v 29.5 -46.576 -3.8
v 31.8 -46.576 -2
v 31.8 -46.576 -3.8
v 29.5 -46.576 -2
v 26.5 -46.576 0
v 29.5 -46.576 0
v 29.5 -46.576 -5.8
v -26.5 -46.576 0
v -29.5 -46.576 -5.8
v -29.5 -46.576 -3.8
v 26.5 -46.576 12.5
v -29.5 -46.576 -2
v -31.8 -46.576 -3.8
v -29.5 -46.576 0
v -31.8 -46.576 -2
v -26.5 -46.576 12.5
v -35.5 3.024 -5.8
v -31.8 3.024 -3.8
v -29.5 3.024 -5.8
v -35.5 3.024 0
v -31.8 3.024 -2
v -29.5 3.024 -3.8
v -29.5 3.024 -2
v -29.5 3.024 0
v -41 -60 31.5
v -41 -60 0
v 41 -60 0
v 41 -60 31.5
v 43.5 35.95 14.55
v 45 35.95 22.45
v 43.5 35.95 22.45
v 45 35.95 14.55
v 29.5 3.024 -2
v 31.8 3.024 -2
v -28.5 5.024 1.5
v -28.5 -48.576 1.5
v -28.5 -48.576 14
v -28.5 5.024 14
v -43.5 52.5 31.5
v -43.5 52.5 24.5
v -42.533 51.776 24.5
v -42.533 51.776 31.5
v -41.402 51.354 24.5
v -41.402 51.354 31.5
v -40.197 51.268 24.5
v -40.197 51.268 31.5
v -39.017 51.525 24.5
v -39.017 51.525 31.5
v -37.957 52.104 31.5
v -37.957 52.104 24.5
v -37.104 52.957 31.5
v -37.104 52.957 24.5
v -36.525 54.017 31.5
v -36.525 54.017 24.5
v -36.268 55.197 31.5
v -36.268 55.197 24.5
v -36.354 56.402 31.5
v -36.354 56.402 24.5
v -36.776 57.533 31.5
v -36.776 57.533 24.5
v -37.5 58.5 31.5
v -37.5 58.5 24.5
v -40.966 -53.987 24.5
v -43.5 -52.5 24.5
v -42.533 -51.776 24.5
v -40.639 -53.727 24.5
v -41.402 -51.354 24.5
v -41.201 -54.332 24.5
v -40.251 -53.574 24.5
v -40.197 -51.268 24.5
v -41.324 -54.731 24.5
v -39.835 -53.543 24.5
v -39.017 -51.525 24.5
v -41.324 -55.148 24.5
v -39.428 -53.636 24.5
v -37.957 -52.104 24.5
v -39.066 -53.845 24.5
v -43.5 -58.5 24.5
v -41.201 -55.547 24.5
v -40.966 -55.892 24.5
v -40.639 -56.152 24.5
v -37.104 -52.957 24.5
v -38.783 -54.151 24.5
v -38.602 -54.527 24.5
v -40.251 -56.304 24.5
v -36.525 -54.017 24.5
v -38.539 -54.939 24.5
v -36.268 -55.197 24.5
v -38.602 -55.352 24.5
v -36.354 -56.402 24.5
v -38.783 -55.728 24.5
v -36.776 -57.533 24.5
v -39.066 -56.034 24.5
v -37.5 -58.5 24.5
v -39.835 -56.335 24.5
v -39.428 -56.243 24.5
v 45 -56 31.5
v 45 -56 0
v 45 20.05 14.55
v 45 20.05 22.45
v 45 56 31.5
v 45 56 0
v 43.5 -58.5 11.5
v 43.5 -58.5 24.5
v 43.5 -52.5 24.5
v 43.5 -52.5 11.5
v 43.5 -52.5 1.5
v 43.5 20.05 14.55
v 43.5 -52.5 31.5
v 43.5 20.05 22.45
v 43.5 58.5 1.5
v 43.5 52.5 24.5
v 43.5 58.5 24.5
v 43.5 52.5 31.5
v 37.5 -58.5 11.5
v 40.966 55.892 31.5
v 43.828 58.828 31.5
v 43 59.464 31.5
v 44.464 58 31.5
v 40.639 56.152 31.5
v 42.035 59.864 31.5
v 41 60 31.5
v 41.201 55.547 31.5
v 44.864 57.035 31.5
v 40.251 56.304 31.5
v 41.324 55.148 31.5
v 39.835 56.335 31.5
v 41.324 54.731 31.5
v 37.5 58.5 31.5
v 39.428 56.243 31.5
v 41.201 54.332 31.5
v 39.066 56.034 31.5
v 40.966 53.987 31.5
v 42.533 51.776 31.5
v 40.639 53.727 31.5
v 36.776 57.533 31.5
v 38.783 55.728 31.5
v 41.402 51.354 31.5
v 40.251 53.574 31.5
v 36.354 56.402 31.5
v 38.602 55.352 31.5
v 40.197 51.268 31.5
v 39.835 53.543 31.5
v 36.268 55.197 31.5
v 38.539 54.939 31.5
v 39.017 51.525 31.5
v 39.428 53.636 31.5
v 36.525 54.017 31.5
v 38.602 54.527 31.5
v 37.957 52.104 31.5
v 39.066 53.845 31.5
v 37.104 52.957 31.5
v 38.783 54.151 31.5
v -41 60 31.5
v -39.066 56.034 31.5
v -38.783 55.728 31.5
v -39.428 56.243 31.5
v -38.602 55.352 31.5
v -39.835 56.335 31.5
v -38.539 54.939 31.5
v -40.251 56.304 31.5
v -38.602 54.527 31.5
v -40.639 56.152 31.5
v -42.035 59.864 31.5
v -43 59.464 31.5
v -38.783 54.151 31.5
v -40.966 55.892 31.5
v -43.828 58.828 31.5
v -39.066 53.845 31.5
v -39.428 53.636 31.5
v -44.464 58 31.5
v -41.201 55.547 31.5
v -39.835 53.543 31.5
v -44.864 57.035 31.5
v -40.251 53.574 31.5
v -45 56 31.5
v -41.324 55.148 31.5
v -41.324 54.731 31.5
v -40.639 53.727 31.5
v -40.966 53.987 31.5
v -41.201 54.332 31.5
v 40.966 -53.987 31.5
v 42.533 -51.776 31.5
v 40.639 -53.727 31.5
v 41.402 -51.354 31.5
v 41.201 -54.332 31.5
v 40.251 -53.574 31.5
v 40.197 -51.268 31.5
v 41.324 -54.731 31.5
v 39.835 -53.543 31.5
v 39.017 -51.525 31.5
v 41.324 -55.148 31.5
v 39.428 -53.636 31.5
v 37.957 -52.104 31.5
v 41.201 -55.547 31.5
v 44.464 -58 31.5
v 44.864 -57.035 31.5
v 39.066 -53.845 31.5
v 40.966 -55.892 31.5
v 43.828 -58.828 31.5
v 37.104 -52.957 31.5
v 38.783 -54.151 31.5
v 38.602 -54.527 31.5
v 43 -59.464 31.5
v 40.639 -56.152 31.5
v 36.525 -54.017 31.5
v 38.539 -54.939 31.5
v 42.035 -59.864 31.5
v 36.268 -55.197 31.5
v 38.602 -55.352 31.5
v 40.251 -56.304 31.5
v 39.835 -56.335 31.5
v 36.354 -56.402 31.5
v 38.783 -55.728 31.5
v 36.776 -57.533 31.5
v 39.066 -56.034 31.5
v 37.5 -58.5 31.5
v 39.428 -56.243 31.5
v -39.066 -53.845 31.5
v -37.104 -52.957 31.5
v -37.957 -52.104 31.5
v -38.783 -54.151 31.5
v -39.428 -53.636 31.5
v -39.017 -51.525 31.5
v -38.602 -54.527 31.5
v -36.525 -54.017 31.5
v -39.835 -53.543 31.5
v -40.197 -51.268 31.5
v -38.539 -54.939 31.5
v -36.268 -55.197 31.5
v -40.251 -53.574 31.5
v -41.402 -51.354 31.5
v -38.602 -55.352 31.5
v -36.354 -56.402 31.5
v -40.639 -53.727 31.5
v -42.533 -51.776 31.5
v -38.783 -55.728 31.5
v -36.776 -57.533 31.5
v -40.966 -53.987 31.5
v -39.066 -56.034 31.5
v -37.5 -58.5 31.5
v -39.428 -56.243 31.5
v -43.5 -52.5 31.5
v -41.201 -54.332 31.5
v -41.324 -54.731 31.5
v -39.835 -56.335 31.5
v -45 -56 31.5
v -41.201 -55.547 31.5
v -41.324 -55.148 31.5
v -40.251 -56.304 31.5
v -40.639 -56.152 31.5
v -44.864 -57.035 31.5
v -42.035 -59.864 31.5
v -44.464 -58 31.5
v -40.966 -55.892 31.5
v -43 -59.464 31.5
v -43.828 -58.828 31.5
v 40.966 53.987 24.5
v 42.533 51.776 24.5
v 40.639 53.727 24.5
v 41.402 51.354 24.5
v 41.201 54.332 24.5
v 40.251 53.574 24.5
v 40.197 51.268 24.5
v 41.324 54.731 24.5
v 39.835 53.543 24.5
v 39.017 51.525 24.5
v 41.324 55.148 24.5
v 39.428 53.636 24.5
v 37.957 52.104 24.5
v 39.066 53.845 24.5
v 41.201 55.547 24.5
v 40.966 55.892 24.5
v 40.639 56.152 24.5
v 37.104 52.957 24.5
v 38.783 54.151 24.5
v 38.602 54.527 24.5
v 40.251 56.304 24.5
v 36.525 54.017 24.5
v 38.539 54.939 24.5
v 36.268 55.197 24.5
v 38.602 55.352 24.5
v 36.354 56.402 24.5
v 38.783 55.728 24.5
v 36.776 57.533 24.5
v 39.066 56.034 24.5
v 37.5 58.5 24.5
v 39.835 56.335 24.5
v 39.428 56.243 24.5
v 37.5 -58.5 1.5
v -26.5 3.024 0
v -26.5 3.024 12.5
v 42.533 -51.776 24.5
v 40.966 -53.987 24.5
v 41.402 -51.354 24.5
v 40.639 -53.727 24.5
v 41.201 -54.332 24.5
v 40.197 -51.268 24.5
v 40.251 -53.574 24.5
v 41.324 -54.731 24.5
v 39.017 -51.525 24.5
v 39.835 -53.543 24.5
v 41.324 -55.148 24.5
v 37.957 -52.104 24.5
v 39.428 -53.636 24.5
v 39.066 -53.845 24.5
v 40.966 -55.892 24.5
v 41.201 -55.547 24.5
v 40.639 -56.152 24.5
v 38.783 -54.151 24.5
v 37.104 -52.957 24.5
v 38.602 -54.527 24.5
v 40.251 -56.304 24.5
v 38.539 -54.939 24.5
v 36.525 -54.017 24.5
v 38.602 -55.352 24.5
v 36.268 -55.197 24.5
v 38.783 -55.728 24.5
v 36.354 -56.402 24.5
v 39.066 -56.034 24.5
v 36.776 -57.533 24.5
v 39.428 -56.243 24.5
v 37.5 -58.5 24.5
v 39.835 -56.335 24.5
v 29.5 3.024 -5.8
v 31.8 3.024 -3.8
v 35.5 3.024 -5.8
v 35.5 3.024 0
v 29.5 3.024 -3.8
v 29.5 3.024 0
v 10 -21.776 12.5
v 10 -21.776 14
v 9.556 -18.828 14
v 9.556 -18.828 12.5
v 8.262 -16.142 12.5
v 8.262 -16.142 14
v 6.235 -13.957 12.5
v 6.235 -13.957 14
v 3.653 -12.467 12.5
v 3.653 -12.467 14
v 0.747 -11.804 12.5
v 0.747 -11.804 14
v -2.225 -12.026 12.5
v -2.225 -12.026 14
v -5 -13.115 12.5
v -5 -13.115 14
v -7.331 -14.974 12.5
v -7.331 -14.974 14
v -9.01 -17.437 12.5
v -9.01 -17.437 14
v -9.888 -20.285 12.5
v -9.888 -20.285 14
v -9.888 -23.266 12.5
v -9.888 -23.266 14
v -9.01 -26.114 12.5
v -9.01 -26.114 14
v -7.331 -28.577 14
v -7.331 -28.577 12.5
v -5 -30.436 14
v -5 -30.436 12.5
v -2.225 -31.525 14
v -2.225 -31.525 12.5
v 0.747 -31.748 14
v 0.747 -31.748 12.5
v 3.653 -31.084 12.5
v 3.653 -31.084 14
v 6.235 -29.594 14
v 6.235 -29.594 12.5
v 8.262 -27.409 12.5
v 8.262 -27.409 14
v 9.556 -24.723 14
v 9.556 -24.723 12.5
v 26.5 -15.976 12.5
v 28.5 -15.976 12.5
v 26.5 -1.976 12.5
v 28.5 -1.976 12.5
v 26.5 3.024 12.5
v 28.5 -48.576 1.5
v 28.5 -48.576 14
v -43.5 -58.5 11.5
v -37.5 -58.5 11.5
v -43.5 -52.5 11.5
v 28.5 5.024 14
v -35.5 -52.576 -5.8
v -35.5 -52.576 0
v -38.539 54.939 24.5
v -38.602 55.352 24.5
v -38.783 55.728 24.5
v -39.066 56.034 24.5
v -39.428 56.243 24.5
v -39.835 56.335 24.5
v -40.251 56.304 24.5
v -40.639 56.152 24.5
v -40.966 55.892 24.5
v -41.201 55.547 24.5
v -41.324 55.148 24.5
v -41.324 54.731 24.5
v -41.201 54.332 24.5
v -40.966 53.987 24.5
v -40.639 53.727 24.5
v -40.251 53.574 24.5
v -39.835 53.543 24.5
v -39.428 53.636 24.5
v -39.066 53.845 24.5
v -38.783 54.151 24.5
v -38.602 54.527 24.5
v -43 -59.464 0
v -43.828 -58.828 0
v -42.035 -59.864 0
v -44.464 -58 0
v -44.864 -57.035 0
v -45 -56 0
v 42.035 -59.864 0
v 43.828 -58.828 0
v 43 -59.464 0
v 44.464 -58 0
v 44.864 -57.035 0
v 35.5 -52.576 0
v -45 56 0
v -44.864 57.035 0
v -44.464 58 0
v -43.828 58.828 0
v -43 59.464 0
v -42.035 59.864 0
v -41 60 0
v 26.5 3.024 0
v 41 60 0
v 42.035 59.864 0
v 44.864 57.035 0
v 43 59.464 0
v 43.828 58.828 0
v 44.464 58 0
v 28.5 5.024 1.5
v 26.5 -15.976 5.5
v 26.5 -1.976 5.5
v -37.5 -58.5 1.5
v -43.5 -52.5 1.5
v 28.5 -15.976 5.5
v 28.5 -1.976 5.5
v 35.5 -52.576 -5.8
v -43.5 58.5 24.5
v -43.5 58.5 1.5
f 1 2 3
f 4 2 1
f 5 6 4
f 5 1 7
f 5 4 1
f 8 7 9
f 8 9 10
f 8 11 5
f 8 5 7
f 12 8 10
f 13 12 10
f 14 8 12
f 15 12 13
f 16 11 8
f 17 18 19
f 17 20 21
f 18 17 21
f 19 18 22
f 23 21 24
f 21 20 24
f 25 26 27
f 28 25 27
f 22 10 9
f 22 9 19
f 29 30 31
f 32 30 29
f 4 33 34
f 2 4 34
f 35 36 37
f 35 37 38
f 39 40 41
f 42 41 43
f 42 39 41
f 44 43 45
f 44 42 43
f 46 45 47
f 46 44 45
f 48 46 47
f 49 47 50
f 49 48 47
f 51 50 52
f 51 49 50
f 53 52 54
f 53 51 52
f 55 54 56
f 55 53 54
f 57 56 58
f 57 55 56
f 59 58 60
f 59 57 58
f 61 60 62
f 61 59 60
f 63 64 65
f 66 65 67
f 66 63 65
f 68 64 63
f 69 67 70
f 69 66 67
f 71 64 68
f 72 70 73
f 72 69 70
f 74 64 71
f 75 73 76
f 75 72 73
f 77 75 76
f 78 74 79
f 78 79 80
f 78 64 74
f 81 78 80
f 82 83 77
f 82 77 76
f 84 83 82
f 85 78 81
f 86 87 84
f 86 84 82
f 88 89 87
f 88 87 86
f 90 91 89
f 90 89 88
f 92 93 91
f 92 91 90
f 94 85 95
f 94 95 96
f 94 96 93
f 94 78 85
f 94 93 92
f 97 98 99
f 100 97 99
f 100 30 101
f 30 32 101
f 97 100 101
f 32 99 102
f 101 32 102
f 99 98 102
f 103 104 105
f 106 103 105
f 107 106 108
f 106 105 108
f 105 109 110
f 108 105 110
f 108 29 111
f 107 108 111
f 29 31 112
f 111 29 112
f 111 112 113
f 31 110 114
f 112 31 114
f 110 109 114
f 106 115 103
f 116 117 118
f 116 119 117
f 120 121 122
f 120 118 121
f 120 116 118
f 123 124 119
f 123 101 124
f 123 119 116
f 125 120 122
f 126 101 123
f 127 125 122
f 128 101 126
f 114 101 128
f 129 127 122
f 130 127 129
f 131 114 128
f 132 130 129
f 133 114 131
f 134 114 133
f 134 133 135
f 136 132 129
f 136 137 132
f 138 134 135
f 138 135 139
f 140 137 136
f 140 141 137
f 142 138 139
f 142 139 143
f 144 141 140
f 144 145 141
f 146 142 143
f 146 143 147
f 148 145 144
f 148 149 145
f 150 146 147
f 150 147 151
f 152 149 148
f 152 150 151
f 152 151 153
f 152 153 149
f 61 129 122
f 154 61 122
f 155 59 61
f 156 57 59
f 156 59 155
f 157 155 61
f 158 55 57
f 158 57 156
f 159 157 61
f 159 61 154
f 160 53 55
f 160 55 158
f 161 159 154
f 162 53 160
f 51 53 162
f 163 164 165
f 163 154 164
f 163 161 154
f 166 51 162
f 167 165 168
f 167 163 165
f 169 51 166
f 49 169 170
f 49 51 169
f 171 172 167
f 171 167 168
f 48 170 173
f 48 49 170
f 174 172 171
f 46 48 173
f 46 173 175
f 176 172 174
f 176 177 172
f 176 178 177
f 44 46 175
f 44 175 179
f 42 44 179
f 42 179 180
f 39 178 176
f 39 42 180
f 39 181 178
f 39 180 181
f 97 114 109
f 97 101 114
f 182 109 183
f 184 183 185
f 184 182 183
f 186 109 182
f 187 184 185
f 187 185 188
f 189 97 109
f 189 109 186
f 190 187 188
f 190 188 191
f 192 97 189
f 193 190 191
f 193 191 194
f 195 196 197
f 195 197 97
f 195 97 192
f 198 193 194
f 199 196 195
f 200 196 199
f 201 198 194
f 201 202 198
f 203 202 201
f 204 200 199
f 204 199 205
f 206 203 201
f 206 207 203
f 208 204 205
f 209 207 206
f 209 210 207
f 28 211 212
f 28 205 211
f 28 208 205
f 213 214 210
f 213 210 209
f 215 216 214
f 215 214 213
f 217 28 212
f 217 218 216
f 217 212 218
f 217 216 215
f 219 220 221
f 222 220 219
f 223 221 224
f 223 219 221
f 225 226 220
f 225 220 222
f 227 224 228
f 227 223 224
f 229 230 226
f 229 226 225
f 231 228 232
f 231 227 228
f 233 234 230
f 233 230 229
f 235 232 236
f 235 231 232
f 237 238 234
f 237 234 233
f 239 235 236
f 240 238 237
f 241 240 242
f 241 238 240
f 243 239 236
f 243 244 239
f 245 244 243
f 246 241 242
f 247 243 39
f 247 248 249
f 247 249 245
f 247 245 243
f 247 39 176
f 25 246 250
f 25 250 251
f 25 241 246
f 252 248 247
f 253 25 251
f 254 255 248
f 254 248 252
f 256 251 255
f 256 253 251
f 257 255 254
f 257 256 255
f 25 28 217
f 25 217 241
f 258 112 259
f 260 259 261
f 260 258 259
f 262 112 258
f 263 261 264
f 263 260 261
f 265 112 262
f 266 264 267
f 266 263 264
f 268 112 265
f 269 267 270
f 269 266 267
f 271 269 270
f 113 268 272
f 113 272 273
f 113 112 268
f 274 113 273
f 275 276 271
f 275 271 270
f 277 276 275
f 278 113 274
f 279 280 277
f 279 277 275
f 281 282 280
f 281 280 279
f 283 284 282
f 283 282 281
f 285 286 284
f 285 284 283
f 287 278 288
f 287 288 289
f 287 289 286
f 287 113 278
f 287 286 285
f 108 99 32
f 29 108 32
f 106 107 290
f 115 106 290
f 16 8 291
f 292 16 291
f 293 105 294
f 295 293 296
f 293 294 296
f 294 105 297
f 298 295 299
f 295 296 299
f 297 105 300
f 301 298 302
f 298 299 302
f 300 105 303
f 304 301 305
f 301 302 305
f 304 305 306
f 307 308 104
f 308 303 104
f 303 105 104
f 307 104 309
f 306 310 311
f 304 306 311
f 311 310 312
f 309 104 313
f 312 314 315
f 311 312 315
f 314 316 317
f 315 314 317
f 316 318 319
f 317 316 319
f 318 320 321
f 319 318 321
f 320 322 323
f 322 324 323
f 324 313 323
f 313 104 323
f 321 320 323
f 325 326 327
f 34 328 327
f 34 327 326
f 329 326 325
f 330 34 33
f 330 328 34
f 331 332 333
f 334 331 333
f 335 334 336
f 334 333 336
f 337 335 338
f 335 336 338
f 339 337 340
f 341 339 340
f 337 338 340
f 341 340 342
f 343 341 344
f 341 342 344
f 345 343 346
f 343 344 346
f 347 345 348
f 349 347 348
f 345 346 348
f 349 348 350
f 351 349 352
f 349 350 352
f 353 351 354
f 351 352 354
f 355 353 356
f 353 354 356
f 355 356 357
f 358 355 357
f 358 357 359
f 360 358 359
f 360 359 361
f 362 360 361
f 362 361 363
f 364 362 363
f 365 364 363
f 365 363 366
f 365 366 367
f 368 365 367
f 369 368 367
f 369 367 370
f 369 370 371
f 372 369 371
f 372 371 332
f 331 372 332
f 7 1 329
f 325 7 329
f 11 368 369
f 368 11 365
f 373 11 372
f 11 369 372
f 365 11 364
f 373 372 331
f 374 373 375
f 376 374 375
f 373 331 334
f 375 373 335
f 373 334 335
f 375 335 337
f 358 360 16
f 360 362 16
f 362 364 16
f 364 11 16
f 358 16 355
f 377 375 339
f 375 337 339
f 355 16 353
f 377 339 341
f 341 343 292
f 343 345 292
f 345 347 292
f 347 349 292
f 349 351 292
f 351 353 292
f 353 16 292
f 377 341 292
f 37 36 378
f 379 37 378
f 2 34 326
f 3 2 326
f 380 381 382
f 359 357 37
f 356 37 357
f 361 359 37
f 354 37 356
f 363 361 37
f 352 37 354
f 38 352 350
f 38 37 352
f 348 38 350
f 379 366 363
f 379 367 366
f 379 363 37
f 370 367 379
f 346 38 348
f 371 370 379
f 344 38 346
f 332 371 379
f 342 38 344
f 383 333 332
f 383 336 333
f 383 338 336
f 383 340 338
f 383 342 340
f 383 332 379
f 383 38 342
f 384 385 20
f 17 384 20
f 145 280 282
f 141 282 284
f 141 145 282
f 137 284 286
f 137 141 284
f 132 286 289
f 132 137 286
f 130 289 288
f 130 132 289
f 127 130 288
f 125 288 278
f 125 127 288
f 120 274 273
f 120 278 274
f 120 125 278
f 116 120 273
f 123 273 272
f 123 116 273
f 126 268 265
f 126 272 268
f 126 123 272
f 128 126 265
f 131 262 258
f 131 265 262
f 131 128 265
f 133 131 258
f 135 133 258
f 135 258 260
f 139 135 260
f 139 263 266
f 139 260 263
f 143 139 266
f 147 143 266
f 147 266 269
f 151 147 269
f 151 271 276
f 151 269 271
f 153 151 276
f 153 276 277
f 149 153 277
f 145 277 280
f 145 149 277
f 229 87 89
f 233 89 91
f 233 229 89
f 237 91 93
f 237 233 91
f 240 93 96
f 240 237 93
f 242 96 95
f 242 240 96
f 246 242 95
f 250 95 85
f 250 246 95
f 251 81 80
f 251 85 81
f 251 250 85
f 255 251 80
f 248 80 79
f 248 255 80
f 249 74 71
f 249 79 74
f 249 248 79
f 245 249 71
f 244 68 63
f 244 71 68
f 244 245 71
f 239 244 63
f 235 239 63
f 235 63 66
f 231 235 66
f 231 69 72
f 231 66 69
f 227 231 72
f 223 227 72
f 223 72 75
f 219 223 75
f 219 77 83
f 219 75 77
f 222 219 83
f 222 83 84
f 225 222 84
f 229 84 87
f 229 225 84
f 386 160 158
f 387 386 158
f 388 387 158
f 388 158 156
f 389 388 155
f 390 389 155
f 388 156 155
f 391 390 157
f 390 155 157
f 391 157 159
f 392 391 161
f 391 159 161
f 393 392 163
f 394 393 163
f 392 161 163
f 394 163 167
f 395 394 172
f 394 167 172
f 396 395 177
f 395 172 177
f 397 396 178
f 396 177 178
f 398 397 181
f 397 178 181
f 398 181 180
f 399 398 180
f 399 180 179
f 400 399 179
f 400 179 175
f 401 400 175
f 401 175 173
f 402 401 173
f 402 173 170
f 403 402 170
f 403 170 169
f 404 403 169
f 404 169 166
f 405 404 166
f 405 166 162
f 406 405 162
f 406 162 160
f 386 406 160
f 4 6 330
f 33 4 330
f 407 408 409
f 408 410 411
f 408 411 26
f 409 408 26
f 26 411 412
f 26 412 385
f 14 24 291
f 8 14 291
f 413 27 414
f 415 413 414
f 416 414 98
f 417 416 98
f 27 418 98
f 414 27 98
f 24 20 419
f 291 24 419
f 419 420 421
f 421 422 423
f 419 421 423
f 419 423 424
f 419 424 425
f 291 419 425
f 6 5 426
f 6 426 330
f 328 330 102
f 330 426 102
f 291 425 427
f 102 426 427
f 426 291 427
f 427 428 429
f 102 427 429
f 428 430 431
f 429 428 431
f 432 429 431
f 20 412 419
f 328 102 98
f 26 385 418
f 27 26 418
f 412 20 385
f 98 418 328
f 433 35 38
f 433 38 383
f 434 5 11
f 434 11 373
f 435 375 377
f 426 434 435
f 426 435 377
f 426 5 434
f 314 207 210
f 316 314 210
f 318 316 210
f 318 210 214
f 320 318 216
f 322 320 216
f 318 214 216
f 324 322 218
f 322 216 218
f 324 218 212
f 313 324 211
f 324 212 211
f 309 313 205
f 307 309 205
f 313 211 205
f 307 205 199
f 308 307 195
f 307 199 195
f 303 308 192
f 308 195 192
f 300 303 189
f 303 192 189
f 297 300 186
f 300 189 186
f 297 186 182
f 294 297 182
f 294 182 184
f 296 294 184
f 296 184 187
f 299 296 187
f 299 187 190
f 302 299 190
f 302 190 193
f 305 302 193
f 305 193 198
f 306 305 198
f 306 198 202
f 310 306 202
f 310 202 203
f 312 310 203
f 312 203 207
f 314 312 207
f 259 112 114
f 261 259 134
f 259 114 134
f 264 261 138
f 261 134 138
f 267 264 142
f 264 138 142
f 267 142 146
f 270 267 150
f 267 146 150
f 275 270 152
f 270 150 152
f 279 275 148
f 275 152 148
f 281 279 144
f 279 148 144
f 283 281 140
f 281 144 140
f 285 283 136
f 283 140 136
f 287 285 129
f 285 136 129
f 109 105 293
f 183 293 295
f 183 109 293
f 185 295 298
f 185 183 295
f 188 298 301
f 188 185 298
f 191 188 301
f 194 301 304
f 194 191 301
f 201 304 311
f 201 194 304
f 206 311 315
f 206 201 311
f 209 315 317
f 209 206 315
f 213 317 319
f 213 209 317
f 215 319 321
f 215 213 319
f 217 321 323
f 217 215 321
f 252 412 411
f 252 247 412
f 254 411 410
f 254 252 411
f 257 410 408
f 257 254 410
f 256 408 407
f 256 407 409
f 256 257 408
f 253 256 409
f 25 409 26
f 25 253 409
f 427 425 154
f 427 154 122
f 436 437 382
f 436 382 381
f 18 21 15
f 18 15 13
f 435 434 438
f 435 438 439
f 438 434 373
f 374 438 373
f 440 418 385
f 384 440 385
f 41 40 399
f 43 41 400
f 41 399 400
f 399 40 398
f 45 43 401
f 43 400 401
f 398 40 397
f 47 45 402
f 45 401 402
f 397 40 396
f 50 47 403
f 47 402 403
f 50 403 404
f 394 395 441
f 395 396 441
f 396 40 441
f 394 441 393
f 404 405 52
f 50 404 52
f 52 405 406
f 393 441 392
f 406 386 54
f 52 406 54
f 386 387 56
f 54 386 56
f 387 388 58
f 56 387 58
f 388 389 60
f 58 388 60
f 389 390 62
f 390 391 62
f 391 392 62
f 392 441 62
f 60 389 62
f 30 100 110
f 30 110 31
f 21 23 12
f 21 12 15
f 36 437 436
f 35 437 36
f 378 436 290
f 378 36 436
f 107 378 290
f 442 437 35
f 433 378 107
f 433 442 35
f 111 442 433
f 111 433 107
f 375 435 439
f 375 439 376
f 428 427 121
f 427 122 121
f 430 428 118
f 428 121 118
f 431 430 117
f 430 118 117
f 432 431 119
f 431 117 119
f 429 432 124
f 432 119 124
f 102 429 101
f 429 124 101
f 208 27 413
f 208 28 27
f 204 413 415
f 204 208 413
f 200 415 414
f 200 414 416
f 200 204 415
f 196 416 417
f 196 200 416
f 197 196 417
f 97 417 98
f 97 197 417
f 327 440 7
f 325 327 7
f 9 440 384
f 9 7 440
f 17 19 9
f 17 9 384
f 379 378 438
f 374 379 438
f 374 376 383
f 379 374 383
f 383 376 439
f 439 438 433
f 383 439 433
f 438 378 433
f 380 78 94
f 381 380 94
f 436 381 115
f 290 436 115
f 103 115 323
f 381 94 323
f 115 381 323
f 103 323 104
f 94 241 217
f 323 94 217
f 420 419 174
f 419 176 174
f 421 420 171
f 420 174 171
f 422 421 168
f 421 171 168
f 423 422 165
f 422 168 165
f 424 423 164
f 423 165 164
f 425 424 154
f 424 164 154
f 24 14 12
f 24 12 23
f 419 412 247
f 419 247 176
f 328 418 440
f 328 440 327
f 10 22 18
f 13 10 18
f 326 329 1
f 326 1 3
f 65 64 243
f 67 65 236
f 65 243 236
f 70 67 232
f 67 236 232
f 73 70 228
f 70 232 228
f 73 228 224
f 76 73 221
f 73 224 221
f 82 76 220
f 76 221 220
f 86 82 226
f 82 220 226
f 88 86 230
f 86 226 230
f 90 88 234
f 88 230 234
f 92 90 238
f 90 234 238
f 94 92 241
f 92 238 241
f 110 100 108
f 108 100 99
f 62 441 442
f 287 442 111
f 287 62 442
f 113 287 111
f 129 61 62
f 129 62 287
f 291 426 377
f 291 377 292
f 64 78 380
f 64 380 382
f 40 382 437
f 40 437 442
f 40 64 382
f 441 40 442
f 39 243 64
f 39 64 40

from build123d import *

# Parameters (mm, degrees)
SKETCH2_W                = 90
SKETCH2_H                = 120
BOSS_EXTRUDE1_DEPTH      = 31.5
SKETCH4_W                = 87
SKETCH4_H                = 117
CUT_EXTRUDE1_DEPTH       = 30
FILLET4_R                = 4
SKETCH18_W               = 57
SKETCH18_H               = 53.6
KHAY_PIN_DEPTH           = 12.5
SKETCH21_W               = 53
SKETCH21_H               = 49.6
BOSS_EXTRUDE11_DEPTH     = 15
SKETCH22_W               = 53
SKETCH22_H               = 49.6
CUT_EXTRUDE4_DEPTH       = 13.5
SKETCH30_W               = 7
SKETCH30_H               = 14
CUT_EXTRUDE8_DEPTH       = 5
SKETCH34_R               = 4.242640687
BOSS_EXTRUDE12_DEPTH     = 7
SKETCH37_W               = 7.9
SKETCH37_H               = 15.9
CUT_EXTRUDE10_DEPTH      = 5
MIRROR2_COPY_1_SKETCH_R  = 4.242640687
MIRROR2_COPY_1_DEPTH     = 7
SKETCH38_R               = 10
CUT_EXTRUDE11_DEPTH      = 10
SKETCH40_W               = 6
SKETCH40_H               = 49.6
BOSS_EXTRUDE13_DEPTH     = 5.8
SKETCH48_W               = 71
SKETCH48_H               = 6
BOSS_EXTRUDE14_DEPTH     = 5.8
SKETCH50_W               = 2.3
SKETCH50_H               = 1.8
CUT_EXTRUDE14_DEPTH      = 49.6
SKETCH52_R               = 1.4
CUT_EXTRUDE15_DEPTH      = 10
MIRROR10_COPY_1_SKETCH_R = 1.4
MIRROR10_COPY_1_DEPTH    = 10
BOSS_EXTRUDE16_DEPTH     = 10


with BuildPart() as part:
    # Sketch2 → Boss-Extrude1 (new body)
    with BuildSketch(Plane.XY):
        Rectangle(SKETCH2_W, SKETCH2_H)
    extrude(amount=BOSS_EXTRUDE1_DEPTH)

    # Sketch4 → Cut-Extrude1 (cut)
    with BuildSketch(Plane.XY.offset(31.5)):
        Rectangle(SKETCH4_W, SKETCH4_H)
    extrude(amount=-CUT_EXTRUDE1_DEPTH, mode=Mode.SUBTRACT)

    # Fillet4
    fillet4_edges = [part.edges().sort_by_distance(p)[0] for p in [
        (45, -60, 15.75),
        (-45, -60, 15.75),
        (-45, 60, 15.75),
        (45, 60, 15.75),
    ]]
    fillet(fillet4_edges, radius=FILLET4_R)

    # Sketch18 → khay_pin (add)
    with BuildSketch(Plane.XY.offset(1.5)):
        with Locations((0, -21.775547075)):
            Rectangle(SKETCH18_W, SKETCH18_H)
    extrude(amount=KHAY_PIN_DEPTH)

    # Sketch21 → Boss-Extrude11 (add)
    with BuildSketch(Plane.XY.offset(14)):
        with Locations((0, -21.775547075)):
            Rectangle(SKETCH21_W, SKETCH21_H)
    extrude(amount=-BOSS_EXTRUDE11_DEPTH)

    # Sketch22 → Cut-Extrude4 (cut)
    with BuildSketch(Plane(origin=(0, 0, -1), x_dir=(-1, 0, 0), z_dir=(0, 0, -1))):
        with Locations((0, -21.775547075)):
            Rectangle(SKETCH22_W, SKETCH22_H)
    extrude(amount=-CUT_EXTRUDE4_DEPTH, mode=Mode.SUBTRACT)

    # Sketch30 → Cut-Extrude8 (cut)
    with BuildSketch(Plane.ZY.offset(-26.5)):
        with Locations((9, -8.975547075)):
            Rectangle(SKETCH30_W, SKETCH30_H)
    extrude(amount=-CUT_EXTRUDE8_DEPTH, mode=Mode.SUBTRACT)

    # Sketch34 → Boss-Extrude12 (add)
    with BuildSketch(Plane.XY.offset(31.5)):
        with Locations((-40.5, 55.5)):
            Circle(SKETCH34_R)
    boss_extrude12 = extrude(amount=-BOSS_EXTRUDE12_DEPTH)

    # Sketch37 → Cut-Extrude10 (cut)
    with BuildSketch(Plane(origin=(45, 0, 0), x_dir=(0, 0, -1), z_dir=(1, 0, 0))):
        with Locations((-18.5, 28)):
            Rectangle(SKETCH37_W, SKETCH37_H)
    extrude(amount=-CUT_EXTRUDE10_DEPTH, mode=Mode.SUBTRACT)

    # Mirror1: Boss-Extrude12 across plane
    add(boss_extrude12.mirror(Plane(origin=(0, 0, 0), x_dir=(0, 0, 1), z_dir=(1, 0, 0))))

    # Mirror2: Boss-Extrude12 across plane
    add(boss_extrude12.mirror(Plane.ZX))

    # Mirror2 copy 1 sketch → Mirror2 copy 1 (add)
    with BuildSketch(Plane(origin=(0, 0, 31.5), x_dir=(-1, 0, 0), z_dir=(0, 0, 1))):
        with Locations((-40.5, 55.5)):
            Circle(MIRROR2_COPY_1_SKETCH_R)
    extrude(amount=-MIRROR2_COPY_1_DEPTH)

    # Sketch38 → Cut-Extrude11 (cut)
    with BuildSketch(Plane.XY.offset(14)):
        with Locations((0, -21.775547075)):
            Circle(SKETCH38_R)
    extrude(amount=-CUT_EXTRUDE11_DEPTH, mode=Mode.SUBTRACT)

    # Sketch40 → Boss-Extrude13 (add)
    with BuildSketch(Plane(origin=(0, 0, 0), x_dir=(-1, 0, 0), z_dir=(0, 0, -1))):
        with Locations((-32.5, -21.775547075)):
            Rectangle(SKETCH40_W, SKETCH40_H)
    boss_extrude13 = extrude(amount=BOSS_EXTRUDE13_DEPTH)

    # Mirror3: Boss-Extrude13 across plane
    add(boss_extrude13.mirror(Plane(origin=(0, 0, 0), x_dir=(0, 0, 1), z_dir=(1, 0, 0))))

    # Sketch48 → Boss-Extrude14 (add)
    with BuildSketch(Plane(origin=(0, 0, 0), x_dir=(-1, 0, 0), z_dir=(0, 0, -1))):
        with Locations((0, -49.575547075)):
            Rectangle(SKETCH48_W, SKETCH48_H)
    extrude(amount=BOSS_EXTRUDE14_DEPTH)

    # Sketch50 → Cut-Extrude14 (cut)
    with BuildSketch(Plane(origin=(0, 3.024452925, 0), x_dir=(1, 0, 0), z_dir=(0, 1, 0))):
        with Locations((30.65, 2.9)):
            Rectangle(SKETCH50_W, SKETCH50_H)
    cut_extrude14 = extrude(amount=-CUT_EXTRUDE14_DEPTH, mode=Mode.SUBTRACT)

    # Mirror7: Cut-Extrude14 across plane
    add(cut_extrude14.mirror(Plane(origin=(0, 0, 0), x_dir=(0, 0, 1), z_dir=(1, 0, 0))), mode=Mode.SUBTRACT)

    # Sketch52 → Cut-Extrude15 (cut)
    with BuildSketch(Plane.XY.offset(31.5)):
        with Locations((-39.939339828, 54.939339828)):
            Circle(SKETCH52_R)
    cut_extrude15 = extrude(amount=-CUT_EXTRUDE15_DEPTH, mode=Mode.SUBTRACT)

    # Mirror9: Cut-Extrude15 across plane
    add(cut_extrude15.mirror(Plane(origin=(0, 0, 0), x_dir=(0, 0, 1), z_dir=(1, 0, 0))), mode=Mode.SUBTRACT)

    # Mirror10: Cut-Extrude15 across plane
    add(cut_extrude15.mirror(Plane.ZX), mode=Mode.SUBTRACT)

    # Mirror10 copy 1 sketch → Mirror10 copy 1 (cut)
    with BuildSketch(Plane(origin=(0, 0, 31.5), x_dir=(-1, 0, 0), z_dir=(0, 0, 1))):
        with Locations((-39.939339828, 54.939339828)):
            Circle(MIRROR10_COPY_1_SKETCH_R)
    extrude(amount=-MIRROR10_COPY_1_DEPTH, mode=Mode.SUBTRACT)

    # Sketch51 → Boss-Extrude16 (add)
    with BuildSketch(Plane.XY.offset(1.5)):
        Polygon((43.5, -52.5), (37.5, -58.5), (43.5, -58.5), align=None)
    boss_extrude16 = extrude(amount=BOSS_EXTRUDE16_DEPTH)

    # Mirror11: Boss-Extrude16 across plane
    add(boss_extrude16.mirror(Plane(origin=(0, 0, 0), x_dir=(0, 0, 1), z_dir=(1, 0, 0))))


solid = part.part
